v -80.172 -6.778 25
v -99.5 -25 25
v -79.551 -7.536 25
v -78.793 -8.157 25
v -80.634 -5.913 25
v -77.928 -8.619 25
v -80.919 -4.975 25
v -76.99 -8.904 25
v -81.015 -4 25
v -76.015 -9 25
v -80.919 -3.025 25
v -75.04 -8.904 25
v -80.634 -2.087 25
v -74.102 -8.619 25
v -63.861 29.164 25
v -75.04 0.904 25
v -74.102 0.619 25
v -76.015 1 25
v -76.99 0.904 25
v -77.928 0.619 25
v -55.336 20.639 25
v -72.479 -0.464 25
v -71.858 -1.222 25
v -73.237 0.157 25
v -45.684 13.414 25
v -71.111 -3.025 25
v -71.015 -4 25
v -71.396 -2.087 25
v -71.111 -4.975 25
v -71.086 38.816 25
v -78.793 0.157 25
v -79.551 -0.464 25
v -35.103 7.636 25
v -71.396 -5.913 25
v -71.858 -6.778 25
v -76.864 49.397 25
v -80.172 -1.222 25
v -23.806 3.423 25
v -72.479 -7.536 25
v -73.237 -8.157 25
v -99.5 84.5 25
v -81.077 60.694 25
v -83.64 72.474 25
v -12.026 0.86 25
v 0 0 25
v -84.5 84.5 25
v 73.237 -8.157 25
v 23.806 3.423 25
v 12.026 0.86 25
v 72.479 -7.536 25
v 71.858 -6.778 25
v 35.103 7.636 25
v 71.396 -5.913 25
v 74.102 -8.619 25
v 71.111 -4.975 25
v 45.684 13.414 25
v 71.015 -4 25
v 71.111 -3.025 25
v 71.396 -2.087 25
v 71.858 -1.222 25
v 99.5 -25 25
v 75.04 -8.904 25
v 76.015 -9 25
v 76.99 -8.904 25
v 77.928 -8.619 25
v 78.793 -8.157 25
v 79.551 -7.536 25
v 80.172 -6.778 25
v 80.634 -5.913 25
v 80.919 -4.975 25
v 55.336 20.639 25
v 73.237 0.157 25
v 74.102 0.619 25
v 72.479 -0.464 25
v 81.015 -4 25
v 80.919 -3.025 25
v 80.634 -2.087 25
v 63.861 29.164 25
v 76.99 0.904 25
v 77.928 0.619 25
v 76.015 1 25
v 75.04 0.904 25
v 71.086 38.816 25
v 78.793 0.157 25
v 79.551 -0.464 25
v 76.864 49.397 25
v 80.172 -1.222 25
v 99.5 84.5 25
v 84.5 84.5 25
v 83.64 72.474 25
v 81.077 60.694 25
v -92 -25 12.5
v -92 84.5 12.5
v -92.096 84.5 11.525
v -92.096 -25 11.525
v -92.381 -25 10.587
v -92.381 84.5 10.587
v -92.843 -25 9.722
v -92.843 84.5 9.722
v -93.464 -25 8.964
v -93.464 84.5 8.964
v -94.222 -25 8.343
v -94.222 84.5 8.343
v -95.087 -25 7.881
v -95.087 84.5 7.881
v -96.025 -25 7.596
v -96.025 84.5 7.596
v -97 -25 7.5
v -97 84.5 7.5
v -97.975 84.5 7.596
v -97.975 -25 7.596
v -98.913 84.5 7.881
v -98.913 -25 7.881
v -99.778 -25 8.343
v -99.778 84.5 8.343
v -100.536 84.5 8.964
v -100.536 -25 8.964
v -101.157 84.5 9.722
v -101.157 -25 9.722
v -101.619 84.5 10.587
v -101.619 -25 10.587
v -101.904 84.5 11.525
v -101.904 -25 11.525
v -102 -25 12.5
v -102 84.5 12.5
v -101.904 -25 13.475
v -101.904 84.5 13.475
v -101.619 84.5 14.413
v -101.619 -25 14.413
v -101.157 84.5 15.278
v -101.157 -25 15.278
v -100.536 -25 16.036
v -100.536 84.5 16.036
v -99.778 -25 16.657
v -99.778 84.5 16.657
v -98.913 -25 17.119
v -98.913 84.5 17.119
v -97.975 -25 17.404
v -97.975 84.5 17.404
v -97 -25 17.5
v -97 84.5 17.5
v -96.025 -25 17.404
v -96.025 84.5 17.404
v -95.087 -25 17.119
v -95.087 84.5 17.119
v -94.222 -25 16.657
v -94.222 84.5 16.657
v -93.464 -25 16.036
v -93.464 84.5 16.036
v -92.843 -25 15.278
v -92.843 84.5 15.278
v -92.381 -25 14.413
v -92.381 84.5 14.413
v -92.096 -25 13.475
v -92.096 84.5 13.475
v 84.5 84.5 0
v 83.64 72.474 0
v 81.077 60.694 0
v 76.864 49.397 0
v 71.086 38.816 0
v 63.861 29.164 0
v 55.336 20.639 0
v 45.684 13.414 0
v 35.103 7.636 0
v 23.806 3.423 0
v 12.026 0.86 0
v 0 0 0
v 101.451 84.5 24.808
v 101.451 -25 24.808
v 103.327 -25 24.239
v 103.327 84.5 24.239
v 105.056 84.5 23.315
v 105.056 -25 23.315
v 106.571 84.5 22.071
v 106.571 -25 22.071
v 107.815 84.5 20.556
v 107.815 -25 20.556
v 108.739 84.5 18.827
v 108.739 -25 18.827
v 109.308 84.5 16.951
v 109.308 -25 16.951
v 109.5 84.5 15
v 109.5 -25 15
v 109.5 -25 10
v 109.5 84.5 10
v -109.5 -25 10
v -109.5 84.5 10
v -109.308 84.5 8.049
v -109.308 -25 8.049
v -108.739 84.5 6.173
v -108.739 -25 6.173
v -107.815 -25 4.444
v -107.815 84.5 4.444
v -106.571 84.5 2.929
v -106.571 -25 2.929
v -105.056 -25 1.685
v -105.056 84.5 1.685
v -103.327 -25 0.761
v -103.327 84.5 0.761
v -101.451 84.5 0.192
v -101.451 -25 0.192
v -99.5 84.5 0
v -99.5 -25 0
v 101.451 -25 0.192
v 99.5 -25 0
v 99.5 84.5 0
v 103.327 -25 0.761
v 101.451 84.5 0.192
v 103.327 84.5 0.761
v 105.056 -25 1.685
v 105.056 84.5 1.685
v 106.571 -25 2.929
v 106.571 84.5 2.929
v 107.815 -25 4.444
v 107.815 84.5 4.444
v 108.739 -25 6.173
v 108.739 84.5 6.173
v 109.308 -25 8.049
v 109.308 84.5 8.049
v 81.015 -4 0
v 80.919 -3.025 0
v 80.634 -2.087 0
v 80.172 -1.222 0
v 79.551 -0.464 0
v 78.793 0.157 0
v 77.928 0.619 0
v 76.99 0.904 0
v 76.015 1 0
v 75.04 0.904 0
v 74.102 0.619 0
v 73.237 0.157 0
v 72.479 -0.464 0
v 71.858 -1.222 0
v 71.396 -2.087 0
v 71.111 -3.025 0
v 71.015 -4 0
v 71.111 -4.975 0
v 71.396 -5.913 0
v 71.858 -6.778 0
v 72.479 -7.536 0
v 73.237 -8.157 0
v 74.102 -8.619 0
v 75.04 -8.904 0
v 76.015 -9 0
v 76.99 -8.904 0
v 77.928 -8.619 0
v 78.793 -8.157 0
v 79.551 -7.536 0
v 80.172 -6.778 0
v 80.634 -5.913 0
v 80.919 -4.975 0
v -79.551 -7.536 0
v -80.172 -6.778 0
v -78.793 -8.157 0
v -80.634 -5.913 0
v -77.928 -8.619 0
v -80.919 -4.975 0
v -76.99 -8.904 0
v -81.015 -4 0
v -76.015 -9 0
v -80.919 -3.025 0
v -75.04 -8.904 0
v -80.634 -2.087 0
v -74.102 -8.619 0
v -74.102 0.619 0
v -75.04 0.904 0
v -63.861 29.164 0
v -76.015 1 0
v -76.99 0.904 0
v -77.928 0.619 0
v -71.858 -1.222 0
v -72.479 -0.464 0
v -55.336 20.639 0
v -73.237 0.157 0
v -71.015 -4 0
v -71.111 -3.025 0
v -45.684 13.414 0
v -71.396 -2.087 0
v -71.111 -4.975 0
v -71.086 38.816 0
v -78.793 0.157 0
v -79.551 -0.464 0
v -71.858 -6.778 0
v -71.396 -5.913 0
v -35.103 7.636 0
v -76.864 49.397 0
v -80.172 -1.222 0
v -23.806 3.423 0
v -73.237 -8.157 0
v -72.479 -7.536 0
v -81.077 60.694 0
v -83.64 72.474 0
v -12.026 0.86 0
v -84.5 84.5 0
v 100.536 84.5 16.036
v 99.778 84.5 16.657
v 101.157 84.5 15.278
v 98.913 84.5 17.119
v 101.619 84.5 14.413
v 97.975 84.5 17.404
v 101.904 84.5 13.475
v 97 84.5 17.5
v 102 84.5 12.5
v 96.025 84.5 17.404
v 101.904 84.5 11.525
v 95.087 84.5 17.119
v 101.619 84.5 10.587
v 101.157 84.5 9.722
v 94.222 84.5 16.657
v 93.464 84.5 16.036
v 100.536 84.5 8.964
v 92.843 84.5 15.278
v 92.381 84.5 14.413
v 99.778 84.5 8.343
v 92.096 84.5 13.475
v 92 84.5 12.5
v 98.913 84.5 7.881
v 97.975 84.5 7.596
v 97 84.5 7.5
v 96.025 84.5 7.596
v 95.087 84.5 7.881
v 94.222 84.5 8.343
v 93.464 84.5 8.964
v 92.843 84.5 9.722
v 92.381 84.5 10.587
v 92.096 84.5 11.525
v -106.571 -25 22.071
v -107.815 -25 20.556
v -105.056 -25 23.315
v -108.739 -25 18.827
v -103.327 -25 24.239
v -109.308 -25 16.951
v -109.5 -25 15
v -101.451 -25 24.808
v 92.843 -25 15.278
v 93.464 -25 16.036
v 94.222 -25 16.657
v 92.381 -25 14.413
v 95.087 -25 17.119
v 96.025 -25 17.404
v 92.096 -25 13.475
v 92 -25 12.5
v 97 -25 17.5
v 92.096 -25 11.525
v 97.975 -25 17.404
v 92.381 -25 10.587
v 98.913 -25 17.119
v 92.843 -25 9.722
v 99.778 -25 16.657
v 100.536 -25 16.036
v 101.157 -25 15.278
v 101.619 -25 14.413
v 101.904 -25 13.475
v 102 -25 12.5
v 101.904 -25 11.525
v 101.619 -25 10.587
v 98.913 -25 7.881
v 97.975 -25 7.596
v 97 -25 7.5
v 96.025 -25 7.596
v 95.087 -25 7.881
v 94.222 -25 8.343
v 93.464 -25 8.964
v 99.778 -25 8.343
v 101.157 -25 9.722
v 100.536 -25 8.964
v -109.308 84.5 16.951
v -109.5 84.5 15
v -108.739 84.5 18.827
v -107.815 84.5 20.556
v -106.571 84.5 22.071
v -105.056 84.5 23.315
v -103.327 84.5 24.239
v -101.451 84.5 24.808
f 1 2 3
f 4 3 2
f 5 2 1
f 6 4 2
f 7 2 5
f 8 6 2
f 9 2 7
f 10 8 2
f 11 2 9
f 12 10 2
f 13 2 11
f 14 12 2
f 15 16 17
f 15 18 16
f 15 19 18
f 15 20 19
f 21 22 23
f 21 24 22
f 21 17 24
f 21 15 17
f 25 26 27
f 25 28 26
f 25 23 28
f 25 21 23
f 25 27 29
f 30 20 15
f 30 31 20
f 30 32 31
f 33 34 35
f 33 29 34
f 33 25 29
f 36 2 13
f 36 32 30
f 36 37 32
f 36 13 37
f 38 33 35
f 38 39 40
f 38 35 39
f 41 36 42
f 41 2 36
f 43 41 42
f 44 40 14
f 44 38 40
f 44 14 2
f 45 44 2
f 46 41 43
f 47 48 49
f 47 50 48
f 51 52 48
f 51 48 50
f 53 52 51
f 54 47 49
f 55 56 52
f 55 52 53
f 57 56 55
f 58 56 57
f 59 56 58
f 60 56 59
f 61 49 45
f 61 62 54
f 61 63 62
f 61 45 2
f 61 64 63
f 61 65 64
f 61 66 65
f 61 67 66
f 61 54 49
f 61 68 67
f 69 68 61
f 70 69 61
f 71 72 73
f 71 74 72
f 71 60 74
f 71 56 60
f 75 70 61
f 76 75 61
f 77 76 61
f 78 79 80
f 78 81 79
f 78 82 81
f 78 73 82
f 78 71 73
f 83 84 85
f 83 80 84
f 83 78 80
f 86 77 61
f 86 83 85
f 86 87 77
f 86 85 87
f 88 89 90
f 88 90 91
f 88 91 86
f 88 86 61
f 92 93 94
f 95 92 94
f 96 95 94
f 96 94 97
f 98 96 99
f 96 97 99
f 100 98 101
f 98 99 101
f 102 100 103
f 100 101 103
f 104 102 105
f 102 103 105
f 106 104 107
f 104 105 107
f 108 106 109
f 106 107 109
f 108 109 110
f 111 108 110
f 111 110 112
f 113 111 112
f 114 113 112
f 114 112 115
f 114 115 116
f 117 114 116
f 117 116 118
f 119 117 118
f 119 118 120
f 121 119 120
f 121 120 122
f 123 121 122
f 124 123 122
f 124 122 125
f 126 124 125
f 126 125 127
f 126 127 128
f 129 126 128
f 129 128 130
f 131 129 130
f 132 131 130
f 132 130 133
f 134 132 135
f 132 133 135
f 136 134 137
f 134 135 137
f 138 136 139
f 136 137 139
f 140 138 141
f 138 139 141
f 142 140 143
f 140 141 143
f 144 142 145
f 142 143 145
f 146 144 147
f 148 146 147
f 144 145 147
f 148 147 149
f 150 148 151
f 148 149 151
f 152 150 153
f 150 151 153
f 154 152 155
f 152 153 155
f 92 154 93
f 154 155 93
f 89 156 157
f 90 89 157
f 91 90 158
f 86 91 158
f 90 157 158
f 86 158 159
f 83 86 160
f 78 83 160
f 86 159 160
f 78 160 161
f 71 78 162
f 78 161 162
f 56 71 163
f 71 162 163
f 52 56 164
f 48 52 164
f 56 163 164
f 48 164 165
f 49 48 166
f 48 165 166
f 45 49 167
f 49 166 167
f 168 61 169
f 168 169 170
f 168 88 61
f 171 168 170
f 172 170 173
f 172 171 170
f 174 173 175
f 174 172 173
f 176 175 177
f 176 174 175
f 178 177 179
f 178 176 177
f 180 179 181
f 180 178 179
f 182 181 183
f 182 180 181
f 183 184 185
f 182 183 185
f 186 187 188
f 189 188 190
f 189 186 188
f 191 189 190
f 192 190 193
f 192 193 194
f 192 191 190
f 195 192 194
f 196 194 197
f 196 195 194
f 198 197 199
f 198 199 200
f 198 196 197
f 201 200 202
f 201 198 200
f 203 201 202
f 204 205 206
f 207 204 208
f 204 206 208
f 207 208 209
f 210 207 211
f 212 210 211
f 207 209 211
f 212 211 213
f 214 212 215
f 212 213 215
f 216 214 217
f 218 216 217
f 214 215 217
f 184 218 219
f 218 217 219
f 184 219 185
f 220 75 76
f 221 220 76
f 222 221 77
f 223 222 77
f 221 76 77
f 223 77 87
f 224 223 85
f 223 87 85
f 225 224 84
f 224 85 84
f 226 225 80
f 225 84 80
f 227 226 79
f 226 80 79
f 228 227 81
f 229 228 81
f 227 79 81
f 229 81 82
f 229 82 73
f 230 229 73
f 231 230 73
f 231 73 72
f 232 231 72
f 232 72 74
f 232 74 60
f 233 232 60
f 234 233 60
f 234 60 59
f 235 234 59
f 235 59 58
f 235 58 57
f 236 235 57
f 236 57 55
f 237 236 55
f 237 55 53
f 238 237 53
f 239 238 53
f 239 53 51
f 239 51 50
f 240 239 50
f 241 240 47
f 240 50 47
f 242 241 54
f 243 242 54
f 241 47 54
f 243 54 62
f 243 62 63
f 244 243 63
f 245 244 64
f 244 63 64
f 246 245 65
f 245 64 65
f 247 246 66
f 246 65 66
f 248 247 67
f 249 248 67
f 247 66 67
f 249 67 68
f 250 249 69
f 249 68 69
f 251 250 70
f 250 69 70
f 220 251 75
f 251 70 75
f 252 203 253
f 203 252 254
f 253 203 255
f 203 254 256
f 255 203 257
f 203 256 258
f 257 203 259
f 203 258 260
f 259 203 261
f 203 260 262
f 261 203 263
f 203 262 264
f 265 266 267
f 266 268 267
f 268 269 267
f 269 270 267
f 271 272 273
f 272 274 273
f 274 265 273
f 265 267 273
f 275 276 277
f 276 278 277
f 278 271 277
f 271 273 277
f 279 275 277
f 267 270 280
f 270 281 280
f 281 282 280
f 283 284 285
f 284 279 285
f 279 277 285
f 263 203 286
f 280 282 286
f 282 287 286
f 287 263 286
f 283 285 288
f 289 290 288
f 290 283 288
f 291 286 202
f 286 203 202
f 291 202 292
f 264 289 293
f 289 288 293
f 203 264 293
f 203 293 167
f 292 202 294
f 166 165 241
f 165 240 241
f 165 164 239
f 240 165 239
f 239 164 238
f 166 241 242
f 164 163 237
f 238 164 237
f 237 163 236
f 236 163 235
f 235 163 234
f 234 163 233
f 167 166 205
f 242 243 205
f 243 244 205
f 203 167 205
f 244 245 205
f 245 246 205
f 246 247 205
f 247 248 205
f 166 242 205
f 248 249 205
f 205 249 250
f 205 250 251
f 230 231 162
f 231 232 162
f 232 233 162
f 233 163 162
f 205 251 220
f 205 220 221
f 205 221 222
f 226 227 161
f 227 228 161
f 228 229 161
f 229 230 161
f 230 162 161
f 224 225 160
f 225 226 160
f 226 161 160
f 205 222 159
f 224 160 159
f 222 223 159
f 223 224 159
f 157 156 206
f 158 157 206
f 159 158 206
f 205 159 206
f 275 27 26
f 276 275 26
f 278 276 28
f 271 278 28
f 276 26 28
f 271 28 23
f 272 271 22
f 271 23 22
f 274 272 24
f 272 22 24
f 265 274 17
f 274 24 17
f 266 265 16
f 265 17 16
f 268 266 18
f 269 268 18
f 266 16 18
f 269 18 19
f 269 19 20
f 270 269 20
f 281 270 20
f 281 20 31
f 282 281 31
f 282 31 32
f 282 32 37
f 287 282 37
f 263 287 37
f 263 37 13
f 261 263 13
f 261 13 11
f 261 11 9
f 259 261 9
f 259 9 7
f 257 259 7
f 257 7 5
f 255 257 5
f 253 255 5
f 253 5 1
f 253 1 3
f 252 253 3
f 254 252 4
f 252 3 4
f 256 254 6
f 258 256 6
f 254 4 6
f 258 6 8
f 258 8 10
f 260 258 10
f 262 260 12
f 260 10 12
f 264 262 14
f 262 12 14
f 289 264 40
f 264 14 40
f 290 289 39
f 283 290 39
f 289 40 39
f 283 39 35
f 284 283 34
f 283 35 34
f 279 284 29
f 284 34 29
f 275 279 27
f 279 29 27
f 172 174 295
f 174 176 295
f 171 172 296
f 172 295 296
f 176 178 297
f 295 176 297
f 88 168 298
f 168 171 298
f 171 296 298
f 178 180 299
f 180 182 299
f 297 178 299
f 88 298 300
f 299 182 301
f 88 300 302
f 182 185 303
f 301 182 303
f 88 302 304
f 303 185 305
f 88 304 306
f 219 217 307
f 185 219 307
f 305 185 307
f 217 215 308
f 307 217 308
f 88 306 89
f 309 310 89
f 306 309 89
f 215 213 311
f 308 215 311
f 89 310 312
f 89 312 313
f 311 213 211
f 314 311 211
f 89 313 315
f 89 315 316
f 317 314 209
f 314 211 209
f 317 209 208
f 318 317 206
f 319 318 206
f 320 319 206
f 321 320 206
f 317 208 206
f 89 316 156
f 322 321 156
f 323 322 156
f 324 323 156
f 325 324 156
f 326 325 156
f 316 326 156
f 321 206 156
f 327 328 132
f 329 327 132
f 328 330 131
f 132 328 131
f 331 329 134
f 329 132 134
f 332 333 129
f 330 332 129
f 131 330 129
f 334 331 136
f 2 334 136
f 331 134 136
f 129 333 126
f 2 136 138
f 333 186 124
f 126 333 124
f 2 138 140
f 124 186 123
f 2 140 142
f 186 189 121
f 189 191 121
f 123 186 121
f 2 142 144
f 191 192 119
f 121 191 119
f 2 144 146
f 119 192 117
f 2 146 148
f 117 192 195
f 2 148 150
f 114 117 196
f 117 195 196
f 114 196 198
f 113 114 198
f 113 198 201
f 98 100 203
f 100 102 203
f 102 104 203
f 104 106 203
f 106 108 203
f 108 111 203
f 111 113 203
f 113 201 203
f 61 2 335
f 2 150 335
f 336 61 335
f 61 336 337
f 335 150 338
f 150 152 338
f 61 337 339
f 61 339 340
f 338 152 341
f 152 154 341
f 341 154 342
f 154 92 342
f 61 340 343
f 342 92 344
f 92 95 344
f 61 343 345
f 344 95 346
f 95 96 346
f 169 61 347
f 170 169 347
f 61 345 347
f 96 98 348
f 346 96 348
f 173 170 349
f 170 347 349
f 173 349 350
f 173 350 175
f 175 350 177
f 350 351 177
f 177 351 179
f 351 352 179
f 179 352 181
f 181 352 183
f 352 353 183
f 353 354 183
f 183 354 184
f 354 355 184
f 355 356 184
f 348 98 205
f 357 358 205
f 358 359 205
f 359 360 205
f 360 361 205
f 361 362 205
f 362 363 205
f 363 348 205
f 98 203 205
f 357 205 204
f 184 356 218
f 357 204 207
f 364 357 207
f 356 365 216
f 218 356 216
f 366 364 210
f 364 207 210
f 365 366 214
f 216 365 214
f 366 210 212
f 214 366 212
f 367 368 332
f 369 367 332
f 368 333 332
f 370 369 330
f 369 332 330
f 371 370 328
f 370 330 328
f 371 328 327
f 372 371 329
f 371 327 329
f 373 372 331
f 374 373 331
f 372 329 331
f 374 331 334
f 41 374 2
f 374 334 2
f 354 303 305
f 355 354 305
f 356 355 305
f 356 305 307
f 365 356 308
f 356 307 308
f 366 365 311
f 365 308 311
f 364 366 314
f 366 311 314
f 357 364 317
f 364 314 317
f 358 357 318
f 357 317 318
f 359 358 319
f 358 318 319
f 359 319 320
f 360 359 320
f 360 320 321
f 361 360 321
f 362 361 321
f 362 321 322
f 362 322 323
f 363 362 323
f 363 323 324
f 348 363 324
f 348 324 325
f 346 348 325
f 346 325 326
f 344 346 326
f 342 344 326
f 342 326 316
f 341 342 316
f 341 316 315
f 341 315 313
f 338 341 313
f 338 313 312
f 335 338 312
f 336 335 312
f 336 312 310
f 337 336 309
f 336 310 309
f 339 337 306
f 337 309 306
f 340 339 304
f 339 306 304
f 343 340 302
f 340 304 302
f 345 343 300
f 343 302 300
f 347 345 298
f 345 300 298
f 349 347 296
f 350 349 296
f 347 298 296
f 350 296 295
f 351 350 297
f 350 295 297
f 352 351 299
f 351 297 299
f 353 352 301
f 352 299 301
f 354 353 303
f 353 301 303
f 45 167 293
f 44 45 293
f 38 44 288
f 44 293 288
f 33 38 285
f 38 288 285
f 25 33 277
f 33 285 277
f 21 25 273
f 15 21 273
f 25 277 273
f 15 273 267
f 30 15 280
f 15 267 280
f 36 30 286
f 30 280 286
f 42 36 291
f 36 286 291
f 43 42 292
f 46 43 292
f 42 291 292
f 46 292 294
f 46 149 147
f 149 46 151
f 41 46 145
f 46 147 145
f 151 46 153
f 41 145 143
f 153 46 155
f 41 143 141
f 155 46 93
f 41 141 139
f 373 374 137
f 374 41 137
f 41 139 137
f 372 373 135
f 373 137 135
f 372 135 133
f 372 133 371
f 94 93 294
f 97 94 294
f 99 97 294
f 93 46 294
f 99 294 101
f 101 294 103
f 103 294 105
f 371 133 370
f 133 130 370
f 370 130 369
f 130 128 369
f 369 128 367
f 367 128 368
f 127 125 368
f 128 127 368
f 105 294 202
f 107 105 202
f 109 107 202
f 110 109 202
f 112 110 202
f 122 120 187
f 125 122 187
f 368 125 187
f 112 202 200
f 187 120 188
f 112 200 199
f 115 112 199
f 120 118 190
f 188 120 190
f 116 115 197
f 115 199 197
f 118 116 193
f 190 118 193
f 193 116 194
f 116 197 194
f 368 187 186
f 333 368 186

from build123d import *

# Parameters (mm, degrees)
BOSS_EXTRUDE1_DEPTH = 25
SKETCH5_R           = 5
CUT_EXTRUDE1_DEPTH  = 5000
SKETCH6_R           = 5
CUT_EXTRUDE2_DEPTH  = 5000
FILLET2_R           = 10


with BuildPart() as part:
    # Sketch4 → Boss-Extrude1 (new body)
    with BuildSketch(Plane.XY):
        with BuildLine():
            ThreePointArc((0, -25), (-77.42819254, 7.07180746), (-109.5, 84.5))
            Line((-109.5, 84.5), (-109.5, -25))
            Line((-109.5, -25), (0, -25))
        make_face()
        with BuildLine():
            ThreePointArc((84.5, 84.5), (59.75052301, 24.74947699), (0, 0))
            ThreePointArc((0, 0), (-59.75052301, 24.74947699), (-84.5, 84.5))
            Line((-84.5, 84.5), (-109.5, 84.5))
            ThreePointArc((-109.5, 84.5), (-77.42819254, 7.07180746), (0, -25))
            ThreePointArc((0, -25), (77.42819254, 7.07180746), (109.5, 84.5))
            Line((109.5, 84.5), (84.5, 84.5))
        make_face()
        with BuildLine():
            Line((109.5, -25), (109.5, 84.5))
            ThreePointArc((109.5, 84.5), (77.42819254, 7.07180746), (0, -25))
            Line((0, -25), (109.5, -25))
        make_face()
    extrude(amount=BOSS_EXTRUDE1_DEPTH)

    # Sketch5 → Cut-Extrude1 (cut)
    with BuildSketch(Plane(origin=(0, 84.5, 0), x_dir=(1, 0, 0), z_dir=(0, 1, 0))):
        with Locations((-97, -12.5)):
            Circle(SKETCH5_R)
        with Locations((97, -12.5)):
            Circle(SKETCH5_R)
    extrude(amount=-CUT_EXTRUDE1_DEPTH, mode=Mode.SUBTRACT)

    # Sketch6 → Cut-Extrude2 (cut)
    with BuildSketch(Plane.XY.offset(25)):
        with Locations((-76.015, -4)):
            Circle(SKETCH6_R)
        with Locations((76.015, -4)):
            Circle(SKETCH6_R)
    extrude(amount=-CUT_EXTRUDE2_DEPTH, mode=Mode.SUBTRACT)

    # Fillet2
    fillet2_edges = [part.edges().sort_by_distance(p)[0] for p in [
        (109.5, 29.75, 25),
        (-109.5, 29.75, 25),
        (-109.5, 29.75, 0),
        (109.5, 29.75, 0),
    ]]
    fillet(fillet2_edges, radius=FILLET2_R)


solid = part.part
